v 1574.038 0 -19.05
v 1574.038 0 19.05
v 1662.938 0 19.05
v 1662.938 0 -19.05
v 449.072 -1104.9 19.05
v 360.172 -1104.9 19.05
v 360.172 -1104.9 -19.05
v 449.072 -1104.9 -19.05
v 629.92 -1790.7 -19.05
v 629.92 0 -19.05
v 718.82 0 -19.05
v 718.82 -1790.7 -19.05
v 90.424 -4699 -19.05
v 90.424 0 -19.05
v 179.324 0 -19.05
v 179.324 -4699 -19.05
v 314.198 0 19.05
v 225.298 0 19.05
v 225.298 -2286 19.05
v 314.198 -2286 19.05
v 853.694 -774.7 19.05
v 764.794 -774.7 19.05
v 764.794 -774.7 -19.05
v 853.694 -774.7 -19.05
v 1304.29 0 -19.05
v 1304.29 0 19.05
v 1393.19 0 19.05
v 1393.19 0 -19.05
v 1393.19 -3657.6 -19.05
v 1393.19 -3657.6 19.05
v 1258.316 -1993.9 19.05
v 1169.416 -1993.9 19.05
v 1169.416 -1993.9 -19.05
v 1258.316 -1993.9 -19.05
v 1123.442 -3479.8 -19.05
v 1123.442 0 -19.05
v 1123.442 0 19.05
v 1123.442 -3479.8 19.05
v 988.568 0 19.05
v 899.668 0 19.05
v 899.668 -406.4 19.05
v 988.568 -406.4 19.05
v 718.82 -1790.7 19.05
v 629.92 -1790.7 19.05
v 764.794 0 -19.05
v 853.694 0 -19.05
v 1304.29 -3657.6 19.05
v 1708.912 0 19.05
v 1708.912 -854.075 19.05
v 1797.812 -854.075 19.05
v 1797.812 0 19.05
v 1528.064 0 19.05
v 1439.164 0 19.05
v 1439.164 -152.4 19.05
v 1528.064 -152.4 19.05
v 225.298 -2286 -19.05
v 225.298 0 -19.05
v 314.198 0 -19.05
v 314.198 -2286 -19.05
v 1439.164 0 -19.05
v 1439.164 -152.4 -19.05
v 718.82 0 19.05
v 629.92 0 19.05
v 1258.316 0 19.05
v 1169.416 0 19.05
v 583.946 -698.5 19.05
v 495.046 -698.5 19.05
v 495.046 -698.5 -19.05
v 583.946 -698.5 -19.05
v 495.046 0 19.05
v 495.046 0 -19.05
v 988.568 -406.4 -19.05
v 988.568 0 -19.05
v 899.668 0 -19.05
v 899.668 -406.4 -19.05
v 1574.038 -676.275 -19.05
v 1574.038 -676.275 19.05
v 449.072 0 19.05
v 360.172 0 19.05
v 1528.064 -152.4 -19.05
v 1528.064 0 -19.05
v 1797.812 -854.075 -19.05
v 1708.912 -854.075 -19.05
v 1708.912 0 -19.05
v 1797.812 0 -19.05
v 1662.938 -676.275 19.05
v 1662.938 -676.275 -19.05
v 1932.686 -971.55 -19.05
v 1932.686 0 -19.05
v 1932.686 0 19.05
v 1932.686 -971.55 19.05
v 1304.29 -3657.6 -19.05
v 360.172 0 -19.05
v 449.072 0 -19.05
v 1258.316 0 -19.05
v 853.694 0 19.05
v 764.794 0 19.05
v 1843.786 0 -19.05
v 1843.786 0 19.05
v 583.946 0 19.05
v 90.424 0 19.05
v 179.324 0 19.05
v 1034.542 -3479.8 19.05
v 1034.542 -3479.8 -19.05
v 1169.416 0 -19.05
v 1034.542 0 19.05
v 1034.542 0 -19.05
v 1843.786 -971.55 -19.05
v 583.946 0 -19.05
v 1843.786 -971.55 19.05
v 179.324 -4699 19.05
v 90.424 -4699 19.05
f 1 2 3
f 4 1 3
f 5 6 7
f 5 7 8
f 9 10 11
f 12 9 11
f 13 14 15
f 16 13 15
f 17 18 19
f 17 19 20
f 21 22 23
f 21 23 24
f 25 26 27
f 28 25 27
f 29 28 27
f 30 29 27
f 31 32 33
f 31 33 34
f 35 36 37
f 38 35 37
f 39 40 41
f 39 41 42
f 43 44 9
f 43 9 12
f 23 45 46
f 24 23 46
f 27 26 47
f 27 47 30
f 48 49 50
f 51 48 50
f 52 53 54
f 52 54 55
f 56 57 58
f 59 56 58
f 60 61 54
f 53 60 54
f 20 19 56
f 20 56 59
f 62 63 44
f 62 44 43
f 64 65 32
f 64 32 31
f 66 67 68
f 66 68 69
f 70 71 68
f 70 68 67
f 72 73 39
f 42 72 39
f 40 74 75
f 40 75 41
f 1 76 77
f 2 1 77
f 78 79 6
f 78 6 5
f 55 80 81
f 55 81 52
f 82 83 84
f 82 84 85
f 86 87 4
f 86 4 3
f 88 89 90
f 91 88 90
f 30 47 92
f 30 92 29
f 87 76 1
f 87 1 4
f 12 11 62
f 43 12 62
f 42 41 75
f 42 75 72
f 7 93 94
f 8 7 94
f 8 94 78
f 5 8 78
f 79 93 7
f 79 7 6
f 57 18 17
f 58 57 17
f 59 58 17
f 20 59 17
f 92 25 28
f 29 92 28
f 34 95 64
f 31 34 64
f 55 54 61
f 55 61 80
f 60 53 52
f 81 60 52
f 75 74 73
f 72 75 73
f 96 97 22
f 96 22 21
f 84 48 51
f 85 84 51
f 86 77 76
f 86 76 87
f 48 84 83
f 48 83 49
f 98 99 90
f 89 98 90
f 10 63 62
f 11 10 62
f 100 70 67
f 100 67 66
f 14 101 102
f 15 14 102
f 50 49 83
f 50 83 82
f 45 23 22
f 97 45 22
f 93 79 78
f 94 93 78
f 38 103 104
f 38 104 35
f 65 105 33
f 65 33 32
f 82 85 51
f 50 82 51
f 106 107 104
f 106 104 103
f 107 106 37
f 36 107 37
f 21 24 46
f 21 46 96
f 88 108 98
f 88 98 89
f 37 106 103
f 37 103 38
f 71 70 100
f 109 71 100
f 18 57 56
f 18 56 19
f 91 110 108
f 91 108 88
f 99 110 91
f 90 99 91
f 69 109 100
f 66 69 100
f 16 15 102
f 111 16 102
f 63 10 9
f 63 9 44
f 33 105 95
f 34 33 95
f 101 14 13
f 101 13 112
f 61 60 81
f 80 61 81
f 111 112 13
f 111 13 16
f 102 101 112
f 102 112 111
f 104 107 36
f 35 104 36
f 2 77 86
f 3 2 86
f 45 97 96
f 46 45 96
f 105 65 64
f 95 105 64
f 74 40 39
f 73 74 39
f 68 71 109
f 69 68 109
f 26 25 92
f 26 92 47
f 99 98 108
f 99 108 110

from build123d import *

# Parameters (mm, degrees)
F0_W      = 88.9
F0_H      = 38.1
F2_DEPTH  = 4699
F3_DEPTH  = 2286
F4_DEPTH  = 1104.9
F5_DEPTH  = 698.5
F6_DEPTH  = 1790.7
F7_DEPTH  = 774.7
F8_DEPTH  = 406.4
F9_DEPTH  = 3479.8
F10_DEPTH = 1993.9
F11_DEPTH = 3657.6
F12_DEPTH = 152.4
F13_DEPTH = 676.275
F14_DEPTH = 854.075
F15_DEPTH = 971.55


# Not quite as in the source:
# - a feature of the source that left no trace in its solid (it failed there, or was rolled back) is left out


with BuildPart() as f2:
    # F0 (on Front) → F2 (new body)
    with BuildSketch(Plane.XZ):
        with Locations((134.874, 0)):
            Rectangle(F0_W, F0_H)
    extrude(amount=F2_DEPTH)


with BuildPart() as f3:
    # F0 (on Front) → F3 (new body)
    with BuildSketch(Plane.XZ):
        with Locations((269.748, 0)):
            Rectangle(F0_W, F0_H)
    extrude(amount=F3_DEPTH)


with BuildPart() as f4:
    # F0 (on Front) → F4 (new body)
    with BuildSketch(Plane.XZ):
        with Locations((404.622, 0)):
            Rectangle(F0_W, F0_H)
    extrude(amount=F4_DEPTH)


with BuildPart() as f5:
    # F0 (on Front) → F5 (new body)
    with BuildSketch(Plane.XZ):
        with Locations((539.496, 0)):
            Rectangle(F0_W, F0_H)
    extrude(amount=F5_DEPTH)


with BuildPart() as f6:
    # F0 (on Front) → F6 (new body)
    with BuildSketch(Plane.XZ):
        with Locations((674.37, 0)):
            Rectangle(F0_W, F0_H)
    extrude(amount=F6_DEPTH)


with BuildPart() as f7:
    # F0 (on Front) → F7 (new body)
    with BuildSketch(Plane.XZ):
        with Locations((809.244, 0)):
            Rectangle(F0_W, F0_H)
    extrude(amount=F7_DEPTH)


with BuildPart() as f8:
    # F0 (on Front) → F8 (new body)
    with BuildSketch(Plane.XZ):
        with Locations((944.118, 0)):
            Rectangle(F0_W, F0_H)
    extrude(amount=F8_DEPTH)


with BuildPart() as f9:
    # F0 (on Front) → F9 (new body)
    with BuildSketch(Plane.XZ):
        with Locations((1078.992, 0)):
            Rectangle(F0_W, F0_H)
    extrude(amount=F9_DEPTH)


with BuildPart() as f10:
    # F0 (on Front) → F10 (new body)
    with BuildSketch(Plane.XZ):
        with Locations((1213.866, 0)):
            Rectangle(F0_W, F0_H)
    extrude(amount=F10_DEPTH)


with BuildPart() as f11:
    # F0 (on Front) → F11 (new body)
    with BuildSketch(Plane.XZ):
        with Locations((1348.74, 0)):
            Rectangle(F0_W, F0_H)
    extrude(amount=F11_DEPTH)


with BuildPart() as f12:
    # F0 (on Front) → F12 (new body)
    with BuildSketch(Plane.XZ):
        with Locations((1483.614, 0)):
            Rectangle(F0_W, F0_H)
    extrude(amount=F12_DEPTH)


with BuildPart() as f13:
    # F0 (on Front) → F13 (new body)
    with BuildSketch(Plane.XZ):
        with Locations((1618.488, 0)):
            Rectangle(F0_W, F0_H)
    extrude(amount=F13_DEPTH)


with BuildPart() as f14:
    # F0 (on Front) → F14 (new body)
    with BuildSketch(Plane.XZ):
        with Locations((1753.362, 0)):
            Rectangle(F0_W, F0_H)
    extrude(amount=F14_DEPTH)


with BuildPart() as f15:
    # F0 (on Front) → F15 (new body)
    with BuildSketch(Plane.XZ):
        with Locations((1888.236, 0)):
            Rectangle(F0_W, F0_H)
    extrude(amount=F15_DEPTH)


solid = Compound([f2.part, f3.part, f4.part, f5.part, f6.part, f7.part, f8.part, f9.part, f10.part, f11.part, f12.part, f13.part, f14.part, f15.part])
